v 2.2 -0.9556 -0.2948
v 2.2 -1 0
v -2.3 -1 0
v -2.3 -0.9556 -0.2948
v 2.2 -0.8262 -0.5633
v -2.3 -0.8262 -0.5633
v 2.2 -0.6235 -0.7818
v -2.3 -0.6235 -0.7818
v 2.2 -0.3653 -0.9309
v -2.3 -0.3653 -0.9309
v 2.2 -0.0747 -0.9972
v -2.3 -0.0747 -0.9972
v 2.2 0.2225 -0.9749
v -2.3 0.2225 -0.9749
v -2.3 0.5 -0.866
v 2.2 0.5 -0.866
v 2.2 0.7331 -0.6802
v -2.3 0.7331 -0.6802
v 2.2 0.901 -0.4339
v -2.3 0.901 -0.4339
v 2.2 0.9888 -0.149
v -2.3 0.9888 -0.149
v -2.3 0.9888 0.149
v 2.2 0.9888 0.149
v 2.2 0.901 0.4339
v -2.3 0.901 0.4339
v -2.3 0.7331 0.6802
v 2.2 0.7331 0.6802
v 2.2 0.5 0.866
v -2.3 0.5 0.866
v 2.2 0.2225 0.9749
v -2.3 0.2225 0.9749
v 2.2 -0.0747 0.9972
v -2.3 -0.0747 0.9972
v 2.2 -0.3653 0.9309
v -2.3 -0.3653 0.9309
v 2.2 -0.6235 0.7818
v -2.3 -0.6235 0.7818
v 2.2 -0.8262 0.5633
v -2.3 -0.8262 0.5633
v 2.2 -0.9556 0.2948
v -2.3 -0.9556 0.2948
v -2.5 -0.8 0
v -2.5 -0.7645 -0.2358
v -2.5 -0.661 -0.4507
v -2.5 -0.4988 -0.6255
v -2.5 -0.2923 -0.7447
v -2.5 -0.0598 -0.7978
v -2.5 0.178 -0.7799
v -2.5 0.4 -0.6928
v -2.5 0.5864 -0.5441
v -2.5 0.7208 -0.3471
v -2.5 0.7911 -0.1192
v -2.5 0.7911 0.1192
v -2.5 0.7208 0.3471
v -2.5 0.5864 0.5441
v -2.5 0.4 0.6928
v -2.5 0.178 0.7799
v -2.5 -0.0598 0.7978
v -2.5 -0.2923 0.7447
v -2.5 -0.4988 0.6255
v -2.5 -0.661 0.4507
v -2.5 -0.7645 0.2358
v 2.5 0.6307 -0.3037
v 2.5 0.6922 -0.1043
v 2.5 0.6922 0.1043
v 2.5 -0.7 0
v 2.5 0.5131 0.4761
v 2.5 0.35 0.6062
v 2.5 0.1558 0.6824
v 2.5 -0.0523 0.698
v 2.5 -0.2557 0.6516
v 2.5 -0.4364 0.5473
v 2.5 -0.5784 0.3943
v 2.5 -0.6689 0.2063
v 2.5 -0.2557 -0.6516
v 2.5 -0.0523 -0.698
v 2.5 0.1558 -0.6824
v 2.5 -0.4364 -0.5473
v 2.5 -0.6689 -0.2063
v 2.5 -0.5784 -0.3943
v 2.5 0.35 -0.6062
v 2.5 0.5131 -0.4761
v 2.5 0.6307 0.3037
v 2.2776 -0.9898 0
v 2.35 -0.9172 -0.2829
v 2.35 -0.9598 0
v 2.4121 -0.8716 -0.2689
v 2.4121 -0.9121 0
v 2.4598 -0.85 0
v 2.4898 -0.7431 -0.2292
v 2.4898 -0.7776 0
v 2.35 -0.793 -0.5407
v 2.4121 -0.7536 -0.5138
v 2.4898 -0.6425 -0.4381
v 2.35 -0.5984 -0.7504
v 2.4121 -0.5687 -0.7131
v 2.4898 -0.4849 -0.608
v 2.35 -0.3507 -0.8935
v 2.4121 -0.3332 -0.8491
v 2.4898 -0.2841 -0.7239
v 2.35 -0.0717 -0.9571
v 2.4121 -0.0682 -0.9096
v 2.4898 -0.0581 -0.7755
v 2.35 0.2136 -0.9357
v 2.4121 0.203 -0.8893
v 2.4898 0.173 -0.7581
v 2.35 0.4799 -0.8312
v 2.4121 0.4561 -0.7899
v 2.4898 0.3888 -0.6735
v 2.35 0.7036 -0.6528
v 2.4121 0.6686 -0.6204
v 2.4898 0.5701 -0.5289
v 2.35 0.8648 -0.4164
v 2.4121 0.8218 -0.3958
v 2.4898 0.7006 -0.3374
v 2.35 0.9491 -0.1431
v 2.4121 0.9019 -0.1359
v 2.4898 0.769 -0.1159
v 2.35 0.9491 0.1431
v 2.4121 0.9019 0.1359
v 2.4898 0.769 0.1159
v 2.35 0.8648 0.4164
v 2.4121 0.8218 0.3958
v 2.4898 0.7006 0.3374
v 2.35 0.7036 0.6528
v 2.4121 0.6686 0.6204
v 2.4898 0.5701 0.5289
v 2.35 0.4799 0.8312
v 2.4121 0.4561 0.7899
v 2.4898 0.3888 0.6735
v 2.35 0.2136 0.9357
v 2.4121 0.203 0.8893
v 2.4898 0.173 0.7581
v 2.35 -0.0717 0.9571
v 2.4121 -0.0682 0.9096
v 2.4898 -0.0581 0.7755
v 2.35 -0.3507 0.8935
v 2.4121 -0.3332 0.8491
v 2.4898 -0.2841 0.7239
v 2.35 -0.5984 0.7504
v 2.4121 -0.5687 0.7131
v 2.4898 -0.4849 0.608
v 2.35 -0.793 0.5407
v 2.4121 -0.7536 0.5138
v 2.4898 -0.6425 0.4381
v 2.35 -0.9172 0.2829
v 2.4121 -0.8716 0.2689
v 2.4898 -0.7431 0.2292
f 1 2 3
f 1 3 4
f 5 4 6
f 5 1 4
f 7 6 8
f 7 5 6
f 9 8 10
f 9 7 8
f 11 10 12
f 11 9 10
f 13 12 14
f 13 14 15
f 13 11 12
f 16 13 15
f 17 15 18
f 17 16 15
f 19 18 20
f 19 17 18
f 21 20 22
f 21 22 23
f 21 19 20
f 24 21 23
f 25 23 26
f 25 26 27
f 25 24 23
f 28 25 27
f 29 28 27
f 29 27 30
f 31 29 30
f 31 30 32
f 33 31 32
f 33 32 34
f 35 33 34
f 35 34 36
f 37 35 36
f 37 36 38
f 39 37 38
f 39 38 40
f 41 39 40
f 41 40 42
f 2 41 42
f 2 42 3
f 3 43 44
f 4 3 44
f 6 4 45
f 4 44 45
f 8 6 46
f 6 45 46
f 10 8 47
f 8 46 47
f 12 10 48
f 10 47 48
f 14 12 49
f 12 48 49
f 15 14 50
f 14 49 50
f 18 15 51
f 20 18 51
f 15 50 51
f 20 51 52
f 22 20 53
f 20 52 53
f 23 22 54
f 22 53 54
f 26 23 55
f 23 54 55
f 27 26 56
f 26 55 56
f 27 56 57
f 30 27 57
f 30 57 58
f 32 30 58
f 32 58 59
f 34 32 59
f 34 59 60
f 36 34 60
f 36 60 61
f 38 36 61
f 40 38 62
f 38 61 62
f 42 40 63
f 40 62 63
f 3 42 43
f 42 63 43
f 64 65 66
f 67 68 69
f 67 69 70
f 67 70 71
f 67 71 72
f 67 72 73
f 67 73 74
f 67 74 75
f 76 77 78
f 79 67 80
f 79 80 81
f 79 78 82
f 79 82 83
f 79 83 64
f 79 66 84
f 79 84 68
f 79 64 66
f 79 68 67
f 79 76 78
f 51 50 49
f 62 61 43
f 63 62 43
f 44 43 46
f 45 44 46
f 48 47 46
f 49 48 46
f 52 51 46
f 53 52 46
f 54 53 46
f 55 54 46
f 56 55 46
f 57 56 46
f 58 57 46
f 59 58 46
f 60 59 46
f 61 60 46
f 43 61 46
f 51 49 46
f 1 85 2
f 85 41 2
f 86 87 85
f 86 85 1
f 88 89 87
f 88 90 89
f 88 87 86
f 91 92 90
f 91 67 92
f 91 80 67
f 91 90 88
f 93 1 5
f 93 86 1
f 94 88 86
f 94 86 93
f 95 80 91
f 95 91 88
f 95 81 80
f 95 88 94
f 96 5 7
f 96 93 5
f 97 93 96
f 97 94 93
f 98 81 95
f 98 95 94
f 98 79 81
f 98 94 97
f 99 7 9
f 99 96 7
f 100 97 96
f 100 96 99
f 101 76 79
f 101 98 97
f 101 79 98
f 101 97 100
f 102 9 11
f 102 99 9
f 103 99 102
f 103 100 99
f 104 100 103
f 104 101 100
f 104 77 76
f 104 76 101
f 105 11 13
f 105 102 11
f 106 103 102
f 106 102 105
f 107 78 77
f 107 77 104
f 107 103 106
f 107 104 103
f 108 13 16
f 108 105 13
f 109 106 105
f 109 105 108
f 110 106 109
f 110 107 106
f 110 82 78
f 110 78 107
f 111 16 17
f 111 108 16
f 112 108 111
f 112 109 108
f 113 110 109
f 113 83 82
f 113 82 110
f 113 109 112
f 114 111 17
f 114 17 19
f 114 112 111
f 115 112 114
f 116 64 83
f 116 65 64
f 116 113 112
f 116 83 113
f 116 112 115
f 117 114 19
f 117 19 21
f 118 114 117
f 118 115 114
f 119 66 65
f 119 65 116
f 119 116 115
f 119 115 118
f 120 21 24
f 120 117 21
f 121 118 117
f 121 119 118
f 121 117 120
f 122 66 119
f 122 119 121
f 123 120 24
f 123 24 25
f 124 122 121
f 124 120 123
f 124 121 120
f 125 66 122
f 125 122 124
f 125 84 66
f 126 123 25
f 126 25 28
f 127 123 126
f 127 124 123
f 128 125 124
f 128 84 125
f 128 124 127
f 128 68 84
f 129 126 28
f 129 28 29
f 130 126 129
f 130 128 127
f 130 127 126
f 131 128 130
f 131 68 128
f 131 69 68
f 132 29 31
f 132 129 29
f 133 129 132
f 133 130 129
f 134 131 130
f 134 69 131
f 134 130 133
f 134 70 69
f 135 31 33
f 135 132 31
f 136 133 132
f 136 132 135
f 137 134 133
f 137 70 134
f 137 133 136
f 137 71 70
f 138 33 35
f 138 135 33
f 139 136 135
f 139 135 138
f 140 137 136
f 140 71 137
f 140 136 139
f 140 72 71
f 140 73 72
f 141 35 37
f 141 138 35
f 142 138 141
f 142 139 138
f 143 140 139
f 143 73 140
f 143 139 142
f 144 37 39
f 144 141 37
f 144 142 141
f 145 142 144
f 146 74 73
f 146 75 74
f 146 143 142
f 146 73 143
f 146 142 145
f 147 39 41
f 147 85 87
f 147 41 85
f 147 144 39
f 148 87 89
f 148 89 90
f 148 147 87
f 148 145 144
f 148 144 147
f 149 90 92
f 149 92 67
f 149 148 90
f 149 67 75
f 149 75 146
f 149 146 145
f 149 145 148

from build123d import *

# Parameters (mm, degrees)
SKETCH1_R           = 1
BOSS_EXTRUDE1_DEPTH = 2.5
FILLET1_R           = 0.3
CHAMFER1_SIZE       = 0.2


with BuildPart() as part:
    # Sketch1 → Boss-Extrude1 (new body, symmetric)
    with BuildSketch(Plane(origin=(0, 0, 0), x_dir=(0, -1, 0), z_dir=(1, 0, 0))):
        Circle(SKETCH1_R)
    extrude(amount=BOSS_EXTRUDE1_DEPTH, both=True)

    # Fillet1
    fillet1_edges = [part.edges().sort_by_distance(p)[0] for p in [
        (2.5, 1, 0),
    ]]
    fillet(fillet1_edges, radius=FILLET1_R)

    # Chamfer1
    chamfer1_edges = [part.edges().sort_by_distance(p)[0] for p in [
        (-2.5, 1, 0),
    ]]
    chamfer(chamfer1_edges, length=CHAMFER1_SIZE)


solid = part.part
